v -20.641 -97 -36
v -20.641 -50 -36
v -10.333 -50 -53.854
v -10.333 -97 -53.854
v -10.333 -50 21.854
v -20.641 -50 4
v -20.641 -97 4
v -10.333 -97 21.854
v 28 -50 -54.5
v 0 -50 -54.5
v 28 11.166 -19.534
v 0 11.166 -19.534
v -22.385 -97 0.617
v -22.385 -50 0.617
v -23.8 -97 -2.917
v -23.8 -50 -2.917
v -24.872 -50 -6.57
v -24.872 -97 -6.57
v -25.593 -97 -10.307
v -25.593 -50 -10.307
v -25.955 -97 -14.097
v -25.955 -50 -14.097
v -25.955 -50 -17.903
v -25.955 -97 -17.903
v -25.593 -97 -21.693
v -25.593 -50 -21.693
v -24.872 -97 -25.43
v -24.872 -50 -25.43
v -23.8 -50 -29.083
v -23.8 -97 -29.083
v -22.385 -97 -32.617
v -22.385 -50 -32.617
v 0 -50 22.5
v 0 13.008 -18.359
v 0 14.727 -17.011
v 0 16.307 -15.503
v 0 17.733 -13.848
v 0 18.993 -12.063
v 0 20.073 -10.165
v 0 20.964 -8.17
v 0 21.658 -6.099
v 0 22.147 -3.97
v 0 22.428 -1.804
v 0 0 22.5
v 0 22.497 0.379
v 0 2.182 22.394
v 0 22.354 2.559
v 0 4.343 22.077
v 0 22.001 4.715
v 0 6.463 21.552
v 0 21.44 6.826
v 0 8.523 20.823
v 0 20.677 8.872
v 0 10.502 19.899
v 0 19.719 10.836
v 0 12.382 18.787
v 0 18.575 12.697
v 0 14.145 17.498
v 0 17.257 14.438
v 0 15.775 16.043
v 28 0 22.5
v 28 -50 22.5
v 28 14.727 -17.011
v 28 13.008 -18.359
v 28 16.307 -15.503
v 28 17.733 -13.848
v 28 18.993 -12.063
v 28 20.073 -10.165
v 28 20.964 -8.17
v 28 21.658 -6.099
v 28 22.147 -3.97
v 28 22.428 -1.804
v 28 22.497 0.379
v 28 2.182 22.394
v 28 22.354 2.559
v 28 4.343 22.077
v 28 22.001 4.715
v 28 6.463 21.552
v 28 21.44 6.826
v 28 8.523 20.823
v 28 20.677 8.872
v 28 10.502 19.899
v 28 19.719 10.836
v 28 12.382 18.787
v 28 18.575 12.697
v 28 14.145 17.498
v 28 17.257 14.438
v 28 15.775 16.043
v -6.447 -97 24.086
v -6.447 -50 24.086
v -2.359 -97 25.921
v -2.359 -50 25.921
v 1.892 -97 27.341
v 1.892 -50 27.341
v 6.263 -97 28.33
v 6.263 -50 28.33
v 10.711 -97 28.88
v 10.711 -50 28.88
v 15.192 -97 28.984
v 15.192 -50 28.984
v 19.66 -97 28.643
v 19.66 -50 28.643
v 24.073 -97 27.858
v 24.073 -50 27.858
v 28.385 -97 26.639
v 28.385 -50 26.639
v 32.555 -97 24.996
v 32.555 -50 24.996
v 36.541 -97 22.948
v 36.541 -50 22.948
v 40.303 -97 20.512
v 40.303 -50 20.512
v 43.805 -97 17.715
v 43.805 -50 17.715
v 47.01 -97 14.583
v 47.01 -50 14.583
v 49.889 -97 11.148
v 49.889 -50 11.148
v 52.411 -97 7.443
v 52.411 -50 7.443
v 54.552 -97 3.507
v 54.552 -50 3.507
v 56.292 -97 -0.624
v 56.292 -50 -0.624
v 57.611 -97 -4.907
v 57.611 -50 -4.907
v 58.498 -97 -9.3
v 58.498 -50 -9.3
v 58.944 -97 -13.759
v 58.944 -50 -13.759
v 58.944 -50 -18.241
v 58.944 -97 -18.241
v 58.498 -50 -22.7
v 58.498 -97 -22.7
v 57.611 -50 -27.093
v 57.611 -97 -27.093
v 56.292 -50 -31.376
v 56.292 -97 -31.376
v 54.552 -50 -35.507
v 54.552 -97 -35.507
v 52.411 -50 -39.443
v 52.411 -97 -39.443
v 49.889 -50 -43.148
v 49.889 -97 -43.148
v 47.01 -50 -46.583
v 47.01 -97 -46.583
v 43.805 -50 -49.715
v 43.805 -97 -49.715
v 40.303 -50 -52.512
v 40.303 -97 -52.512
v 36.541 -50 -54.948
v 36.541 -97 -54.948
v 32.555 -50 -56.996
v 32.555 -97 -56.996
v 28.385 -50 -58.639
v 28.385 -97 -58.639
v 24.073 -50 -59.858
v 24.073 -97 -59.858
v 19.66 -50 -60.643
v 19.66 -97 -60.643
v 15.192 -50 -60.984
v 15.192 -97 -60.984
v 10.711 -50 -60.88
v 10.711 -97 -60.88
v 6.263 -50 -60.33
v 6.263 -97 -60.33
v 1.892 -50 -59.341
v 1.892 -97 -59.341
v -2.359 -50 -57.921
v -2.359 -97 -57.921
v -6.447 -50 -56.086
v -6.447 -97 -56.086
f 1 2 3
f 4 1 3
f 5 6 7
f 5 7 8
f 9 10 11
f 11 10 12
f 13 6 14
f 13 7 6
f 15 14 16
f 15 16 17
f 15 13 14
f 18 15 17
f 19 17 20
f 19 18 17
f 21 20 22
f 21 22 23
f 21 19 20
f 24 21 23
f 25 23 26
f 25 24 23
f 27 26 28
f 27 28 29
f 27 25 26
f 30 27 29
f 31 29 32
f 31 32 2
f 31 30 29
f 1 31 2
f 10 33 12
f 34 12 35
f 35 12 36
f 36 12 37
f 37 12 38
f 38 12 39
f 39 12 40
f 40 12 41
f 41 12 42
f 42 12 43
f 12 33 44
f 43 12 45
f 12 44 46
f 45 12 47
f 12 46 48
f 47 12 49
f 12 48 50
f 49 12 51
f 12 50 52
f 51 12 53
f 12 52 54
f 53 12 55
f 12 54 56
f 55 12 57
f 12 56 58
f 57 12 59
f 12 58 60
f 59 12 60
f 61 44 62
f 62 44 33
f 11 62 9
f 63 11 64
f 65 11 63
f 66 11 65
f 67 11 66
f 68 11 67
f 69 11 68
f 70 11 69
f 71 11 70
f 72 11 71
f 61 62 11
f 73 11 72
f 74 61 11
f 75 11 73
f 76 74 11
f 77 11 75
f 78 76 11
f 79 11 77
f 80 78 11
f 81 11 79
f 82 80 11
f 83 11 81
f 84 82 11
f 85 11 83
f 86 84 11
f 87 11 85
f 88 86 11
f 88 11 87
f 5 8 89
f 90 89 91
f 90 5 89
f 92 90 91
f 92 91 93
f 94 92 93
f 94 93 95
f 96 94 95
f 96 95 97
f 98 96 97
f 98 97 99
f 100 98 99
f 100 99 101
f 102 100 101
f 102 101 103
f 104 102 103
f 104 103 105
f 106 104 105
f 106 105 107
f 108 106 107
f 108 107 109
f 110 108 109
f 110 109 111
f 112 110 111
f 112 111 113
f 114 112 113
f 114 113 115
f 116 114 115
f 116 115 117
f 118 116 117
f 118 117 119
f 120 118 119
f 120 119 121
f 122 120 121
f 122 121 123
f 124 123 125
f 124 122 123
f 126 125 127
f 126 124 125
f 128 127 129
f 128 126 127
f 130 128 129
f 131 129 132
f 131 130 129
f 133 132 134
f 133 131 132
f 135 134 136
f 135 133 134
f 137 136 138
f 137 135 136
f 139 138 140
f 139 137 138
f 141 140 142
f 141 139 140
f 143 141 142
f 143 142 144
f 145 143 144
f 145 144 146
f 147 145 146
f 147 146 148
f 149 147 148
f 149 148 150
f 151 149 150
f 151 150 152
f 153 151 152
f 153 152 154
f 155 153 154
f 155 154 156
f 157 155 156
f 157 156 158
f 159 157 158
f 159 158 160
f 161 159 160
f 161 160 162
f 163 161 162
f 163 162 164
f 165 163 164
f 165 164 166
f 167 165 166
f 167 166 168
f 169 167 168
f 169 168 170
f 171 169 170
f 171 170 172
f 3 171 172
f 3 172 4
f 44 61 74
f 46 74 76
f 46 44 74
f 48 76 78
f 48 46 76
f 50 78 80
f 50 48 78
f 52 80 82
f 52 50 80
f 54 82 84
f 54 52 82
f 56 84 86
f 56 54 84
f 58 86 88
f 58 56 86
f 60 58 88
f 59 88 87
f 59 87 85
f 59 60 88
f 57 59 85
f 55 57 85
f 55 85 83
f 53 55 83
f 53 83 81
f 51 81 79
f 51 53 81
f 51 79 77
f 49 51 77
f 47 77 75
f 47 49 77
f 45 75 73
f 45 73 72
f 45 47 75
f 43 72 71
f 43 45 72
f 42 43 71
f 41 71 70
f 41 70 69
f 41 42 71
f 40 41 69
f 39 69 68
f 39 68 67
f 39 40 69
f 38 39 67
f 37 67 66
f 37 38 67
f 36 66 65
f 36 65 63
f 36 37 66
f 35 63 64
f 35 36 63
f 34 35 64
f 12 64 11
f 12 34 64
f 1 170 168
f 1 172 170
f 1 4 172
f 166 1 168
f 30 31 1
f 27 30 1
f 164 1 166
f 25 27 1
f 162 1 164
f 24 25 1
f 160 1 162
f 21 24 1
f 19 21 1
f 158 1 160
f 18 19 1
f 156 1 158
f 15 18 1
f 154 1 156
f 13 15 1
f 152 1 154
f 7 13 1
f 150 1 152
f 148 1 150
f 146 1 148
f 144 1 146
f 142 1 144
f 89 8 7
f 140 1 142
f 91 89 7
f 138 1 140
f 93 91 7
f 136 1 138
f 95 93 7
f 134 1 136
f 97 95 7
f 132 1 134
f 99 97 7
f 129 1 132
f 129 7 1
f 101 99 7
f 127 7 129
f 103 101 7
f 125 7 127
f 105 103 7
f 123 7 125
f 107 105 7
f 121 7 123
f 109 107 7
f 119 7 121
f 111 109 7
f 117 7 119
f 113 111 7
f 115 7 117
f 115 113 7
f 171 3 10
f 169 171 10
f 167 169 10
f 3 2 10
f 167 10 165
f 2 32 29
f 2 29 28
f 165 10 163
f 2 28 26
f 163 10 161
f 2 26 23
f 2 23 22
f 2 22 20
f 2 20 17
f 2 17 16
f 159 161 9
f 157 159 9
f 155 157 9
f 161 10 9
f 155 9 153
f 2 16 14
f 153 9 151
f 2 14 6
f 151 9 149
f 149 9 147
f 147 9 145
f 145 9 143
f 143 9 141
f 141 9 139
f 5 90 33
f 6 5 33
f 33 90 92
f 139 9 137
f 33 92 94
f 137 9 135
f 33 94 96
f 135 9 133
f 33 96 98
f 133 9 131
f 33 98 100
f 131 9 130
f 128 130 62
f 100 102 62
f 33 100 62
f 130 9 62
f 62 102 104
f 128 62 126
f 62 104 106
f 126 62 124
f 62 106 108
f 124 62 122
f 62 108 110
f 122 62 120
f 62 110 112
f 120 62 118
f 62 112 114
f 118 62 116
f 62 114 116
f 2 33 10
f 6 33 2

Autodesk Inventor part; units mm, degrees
ref_plane "YZ Plane" through (0, 0, 0) normal (1, 0, 0) x (0, 1, 0)
ref_plane "XZ Plane" through (0, 0, 0) normal (0, 1, 0) x (-1, 0, 0)
sketch "Sketch1" plane through (0, 0, 0) normal (1, 0, 0) x (0, 1, 0)
  circle A0 centre (0, 0) radius 22.5
  line L0 (0, 22.5) -> (-50, 22.5)
  line L1 (-50, 22.5) -> (-50, -54.5)
  line L2 (-50, -54.5) -> (11.1665, -19.5335)
  dimension "d0" = 45
  dimension "d1" = 50
  dimension "d2" = 77
extrude "Extrusion1" add sketch "Sketch1" along normal blind 28
sketch "Sketch2" plane through (0, -50, -54.5) normal (0, -1, 0) x (1, 0, 0)
  circle A0 centre (14, 38.5) radius 45
  line L0 (0, 77) -> (28, 77) projected
  line L1 (0, 77) -> (0, 0) projected
  point P0 (0, 54.5)
  point P1 (14, 77)
  point P2 (0, 38.5)
  dimension "d5" = 90
extrude "Extrusion2" add sketch "Sketch2" along normal blind 47
sketch "Sketch3" plane through (14, -97, -16) normal (0, -1, 0) x (1, 0, 0)
  circle A0 centre (0, 0) radius 45 projected
  circle A1 centre (0, 0) radius 40
  line L0 (0, 0) -> (-45, 0) construction
  line L1 (0, 0) -> (-38.9711, 22.5) construction
  line L2 (0, 0) -> (-38.9711, -22.5) construction
  line L3 (-34.641, 20) -> (-24.3333, 37.8536)
  line L4 (-34.641, -20) -> (-24.3333, -37.8536)
  point P0 (-14, 16)
  dimension "d14" = 80
  dimension "d15" = 30
extrude "Extrusion3" cut sketch "Sketch3" against normal through all contours L3 A1 L4 A0 picked at (-30.1132, -30.0405)
ref_plane "Work Plane1" through (0, -73.5, -54.5) normal (0, 1, 0) x (1, 0, 0)
properties part number "hip_back"
